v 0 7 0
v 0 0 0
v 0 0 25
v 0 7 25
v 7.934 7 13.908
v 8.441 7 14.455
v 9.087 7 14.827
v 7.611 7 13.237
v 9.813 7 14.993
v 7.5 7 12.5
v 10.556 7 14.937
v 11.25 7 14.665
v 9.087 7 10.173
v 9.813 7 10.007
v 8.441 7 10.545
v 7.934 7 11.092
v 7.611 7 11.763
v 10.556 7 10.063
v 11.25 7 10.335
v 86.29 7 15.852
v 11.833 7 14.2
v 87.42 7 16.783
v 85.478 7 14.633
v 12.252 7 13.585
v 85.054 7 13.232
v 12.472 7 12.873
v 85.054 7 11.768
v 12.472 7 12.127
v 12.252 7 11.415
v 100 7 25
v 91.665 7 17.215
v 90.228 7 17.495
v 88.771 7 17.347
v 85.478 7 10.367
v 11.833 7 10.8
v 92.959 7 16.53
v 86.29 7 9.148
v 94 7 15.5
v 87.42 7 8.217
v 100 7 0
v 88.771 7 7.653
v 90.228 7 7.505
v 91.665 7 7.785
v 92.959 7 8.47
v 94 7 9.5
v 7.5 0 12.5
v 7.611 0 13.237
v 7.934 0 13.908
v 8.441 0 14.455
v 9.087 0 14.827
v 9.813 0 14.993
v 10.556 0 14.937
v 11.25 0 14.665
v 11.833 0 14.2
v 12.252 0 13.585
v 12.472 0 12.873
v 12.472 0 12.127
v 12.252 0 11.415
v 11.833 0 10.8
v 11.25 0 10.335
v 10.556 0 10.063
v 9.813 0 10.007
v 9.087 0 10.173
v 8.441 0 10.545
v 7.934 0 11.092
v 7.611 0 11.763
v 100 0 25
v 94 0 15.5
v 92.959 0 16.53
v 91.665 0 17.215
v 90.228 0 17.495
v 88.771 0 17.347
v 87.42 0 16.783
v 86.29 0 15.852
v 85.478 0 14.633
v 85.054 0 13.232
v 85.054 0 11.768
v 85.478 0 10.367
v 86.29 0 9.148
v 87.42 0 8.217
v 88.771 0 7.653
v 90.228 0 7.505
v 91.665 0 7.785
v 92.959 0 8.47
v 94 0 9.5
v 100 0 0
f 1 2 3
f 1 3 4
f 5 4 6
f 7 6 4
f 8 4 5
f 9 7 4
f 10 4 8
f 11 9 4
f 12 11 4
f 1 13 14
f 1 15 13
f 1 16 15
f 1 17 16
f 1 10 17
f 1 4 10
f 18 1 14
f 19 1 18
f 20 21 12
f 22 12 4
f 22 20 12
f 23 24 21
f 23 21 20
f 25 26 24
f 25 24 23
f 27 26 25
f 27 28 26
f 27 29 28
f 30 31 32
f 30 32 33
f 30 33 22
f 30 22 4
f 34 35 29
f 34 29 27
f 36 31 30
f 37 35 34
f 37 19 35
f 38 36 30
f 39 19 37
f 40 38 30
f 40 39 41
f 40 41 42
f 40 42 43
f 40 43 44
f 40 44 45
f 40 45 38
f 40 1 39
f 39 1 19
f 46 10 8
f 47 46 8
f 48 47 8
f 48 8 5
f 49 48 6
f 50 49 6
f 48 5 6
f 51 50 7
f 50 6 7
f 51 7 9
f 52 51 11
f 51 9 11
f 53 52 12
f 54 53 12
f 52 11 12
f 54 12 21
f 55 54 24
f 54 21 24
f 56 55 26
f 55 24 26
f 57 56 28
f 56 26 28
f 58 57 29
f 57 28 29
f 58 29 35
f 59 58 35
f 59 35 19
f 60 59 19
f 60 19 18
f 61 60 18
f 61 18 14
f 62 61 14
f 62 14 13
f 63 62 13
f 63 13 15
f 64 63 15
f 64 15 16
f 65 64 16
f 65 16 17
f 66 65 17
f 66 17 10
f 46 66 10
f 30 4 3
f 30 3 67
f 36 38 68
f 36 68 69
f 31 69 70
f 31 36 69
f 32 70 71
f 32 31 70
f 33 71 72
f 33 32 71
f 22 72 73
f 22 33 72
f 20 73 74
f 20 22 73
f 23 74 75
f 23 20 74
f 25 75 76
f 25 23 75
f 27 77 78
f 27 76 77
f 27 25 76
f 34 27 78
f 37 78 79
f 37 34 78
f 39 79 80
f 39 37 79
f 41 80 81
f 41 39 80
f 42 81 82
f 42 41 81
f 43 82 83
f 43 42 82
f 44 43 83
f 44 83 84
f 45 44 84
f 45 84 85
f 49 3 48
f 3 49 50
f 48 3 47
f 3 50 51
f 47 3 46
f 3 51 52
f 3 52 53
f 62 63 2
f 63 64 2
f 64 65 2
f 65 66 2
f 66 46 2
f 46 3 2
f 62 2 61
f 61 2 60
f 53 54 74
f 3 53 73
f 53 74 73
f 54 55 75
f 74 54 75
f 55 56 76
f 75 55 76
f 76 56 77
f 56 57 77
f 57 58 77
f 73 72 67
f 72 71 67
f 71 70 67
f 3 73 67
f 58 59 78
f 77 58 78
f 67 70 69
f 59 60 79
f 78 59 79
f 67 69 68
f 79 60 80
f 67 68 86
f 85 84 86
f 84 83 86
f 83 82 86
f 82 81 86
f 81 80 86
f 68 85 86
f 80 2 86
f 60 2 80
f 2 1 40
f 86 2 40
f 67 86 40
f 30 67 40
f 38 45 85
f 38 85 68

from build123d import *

# Parameters (mm, degrees)
SKETCH1_W          = 100
SKETCH1_H          = 7
BASE_EXTRUDE_DEPTH = 25
CUT_EXTRUDE1_DEPTH = 8
SKETCH3_R          = 2.5
CUT_EXTRUDE2_DEPTH = 8


with BuildPart() as part:
    # Sketch1 → Base-Extrude (new body)
    with BuildSketch(Plane.XY):
        with Locations((50, 3.5)):
            Rectangle(SKETCH1_W, SKETCH1_H)
    extrude(amount=BASE_EXTRUDE_DEPTH)

    # Sketch2 → Cut-Extrude1 (cut, through all)
    with BuildSketch(Plane(origin=(0, 7, 0), x_dir=(-1, 0, 0), z_dir=(0, 1, 0))):
        with BuildLine():
            Line((-94, 9.5), (-94, 15.5))
            ThreePointArc((-94, 15.5), (-85, 12.5), (-94, 9.5))
        make_face()
    extrude(amount=-CUT_EXTRUDE1_DEPTH, mode=Mode.SUBTRACT)

    # Sketch3 → Cut-Extrude2 (cut, through all)
    with BuildSketch(Plane(origin=(0, 7, 0), x_dir=(-1, 0, 0), z_dir=(0, 1, 0))):
        with Locations((-10, 12.5)):
            Circle(SKETCH3_R)
    extrude(amount=-CUT_EXTRUDE2_DEPTH, mode=Mode.SUBTRACT)


solid = part.part
